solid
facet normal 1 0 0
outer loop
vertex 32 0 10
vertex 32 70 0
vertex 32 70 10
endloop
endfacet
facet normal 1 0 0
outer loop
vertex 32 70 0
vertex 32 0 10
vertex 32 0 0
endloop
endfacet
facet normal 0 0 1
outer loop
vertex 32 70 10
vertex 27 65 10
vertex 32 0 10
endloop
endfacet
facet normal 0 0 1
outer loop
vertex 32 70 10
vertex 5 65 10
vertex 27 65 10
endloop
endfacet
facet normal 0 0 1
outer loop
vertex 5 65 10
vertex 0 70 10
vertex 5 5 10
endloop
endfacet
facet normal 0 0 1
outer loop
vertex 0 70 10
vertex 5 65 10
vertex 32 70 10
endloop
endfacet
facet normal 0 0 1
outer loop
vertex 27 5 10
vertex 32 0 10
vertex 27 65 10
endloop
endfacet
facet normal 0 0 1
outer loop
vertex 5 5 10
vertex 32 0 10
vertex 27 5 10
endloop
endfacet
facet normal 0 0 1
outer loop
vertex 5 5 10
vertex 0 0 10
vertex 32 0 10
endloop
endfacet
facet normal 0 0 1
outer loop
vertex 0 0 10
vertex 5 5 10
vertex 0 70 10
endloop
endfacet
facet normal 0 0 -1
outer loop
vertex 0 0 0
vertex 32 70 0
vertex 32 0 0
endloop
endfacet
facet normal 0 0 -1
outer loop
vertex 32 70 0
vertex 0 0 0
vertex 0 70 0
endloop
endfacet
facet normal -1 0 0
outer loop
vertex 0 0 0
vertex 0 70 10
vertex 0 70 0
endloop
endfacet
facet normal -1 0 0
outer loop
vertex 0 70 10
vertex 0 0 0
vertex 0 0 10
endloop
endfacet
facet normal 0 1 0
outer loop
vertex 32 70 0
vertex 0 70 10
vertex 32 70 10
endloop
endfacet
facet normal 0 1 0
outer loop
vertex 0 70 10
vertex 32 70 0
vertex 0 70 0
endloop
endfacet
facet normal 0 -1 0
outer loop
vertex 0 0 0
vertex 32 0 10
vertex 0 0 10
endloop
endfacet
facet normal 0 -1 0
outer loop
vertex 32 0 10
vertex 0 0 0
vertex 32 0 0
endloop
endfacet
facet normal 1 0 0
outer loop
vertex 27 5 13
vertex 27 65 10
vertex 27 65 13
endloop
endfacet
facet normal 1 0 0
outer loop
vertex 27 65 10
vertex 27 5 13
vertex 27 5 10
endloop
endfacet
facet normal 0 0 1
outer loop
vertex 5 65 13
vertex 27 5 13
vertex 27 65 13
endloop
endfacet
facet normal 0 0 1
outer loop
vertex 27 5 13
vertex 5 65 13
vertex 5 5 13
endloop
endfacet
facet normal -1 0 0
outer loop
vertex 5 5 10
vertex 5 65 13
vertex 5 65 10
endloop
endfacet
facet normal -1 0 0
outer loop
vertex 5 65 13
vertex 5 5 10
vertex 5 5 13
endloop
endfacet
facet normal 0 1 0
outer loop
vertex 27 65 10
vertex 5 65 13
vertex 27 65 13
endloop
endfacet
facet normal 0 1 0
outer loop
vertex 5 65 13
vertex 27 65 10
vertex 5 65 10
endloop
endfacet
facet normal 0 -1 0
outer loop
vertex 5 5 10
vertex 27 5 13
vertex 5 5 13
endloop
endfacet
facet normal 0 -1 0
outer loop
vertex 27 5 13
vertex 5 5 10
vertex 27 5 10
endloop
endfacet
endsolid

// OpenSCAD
union(){
  cube([32,70,10]);
  translate([5, 5, 1]) {
    cube(size=[22, 60, 12], center=false);
  }
}
